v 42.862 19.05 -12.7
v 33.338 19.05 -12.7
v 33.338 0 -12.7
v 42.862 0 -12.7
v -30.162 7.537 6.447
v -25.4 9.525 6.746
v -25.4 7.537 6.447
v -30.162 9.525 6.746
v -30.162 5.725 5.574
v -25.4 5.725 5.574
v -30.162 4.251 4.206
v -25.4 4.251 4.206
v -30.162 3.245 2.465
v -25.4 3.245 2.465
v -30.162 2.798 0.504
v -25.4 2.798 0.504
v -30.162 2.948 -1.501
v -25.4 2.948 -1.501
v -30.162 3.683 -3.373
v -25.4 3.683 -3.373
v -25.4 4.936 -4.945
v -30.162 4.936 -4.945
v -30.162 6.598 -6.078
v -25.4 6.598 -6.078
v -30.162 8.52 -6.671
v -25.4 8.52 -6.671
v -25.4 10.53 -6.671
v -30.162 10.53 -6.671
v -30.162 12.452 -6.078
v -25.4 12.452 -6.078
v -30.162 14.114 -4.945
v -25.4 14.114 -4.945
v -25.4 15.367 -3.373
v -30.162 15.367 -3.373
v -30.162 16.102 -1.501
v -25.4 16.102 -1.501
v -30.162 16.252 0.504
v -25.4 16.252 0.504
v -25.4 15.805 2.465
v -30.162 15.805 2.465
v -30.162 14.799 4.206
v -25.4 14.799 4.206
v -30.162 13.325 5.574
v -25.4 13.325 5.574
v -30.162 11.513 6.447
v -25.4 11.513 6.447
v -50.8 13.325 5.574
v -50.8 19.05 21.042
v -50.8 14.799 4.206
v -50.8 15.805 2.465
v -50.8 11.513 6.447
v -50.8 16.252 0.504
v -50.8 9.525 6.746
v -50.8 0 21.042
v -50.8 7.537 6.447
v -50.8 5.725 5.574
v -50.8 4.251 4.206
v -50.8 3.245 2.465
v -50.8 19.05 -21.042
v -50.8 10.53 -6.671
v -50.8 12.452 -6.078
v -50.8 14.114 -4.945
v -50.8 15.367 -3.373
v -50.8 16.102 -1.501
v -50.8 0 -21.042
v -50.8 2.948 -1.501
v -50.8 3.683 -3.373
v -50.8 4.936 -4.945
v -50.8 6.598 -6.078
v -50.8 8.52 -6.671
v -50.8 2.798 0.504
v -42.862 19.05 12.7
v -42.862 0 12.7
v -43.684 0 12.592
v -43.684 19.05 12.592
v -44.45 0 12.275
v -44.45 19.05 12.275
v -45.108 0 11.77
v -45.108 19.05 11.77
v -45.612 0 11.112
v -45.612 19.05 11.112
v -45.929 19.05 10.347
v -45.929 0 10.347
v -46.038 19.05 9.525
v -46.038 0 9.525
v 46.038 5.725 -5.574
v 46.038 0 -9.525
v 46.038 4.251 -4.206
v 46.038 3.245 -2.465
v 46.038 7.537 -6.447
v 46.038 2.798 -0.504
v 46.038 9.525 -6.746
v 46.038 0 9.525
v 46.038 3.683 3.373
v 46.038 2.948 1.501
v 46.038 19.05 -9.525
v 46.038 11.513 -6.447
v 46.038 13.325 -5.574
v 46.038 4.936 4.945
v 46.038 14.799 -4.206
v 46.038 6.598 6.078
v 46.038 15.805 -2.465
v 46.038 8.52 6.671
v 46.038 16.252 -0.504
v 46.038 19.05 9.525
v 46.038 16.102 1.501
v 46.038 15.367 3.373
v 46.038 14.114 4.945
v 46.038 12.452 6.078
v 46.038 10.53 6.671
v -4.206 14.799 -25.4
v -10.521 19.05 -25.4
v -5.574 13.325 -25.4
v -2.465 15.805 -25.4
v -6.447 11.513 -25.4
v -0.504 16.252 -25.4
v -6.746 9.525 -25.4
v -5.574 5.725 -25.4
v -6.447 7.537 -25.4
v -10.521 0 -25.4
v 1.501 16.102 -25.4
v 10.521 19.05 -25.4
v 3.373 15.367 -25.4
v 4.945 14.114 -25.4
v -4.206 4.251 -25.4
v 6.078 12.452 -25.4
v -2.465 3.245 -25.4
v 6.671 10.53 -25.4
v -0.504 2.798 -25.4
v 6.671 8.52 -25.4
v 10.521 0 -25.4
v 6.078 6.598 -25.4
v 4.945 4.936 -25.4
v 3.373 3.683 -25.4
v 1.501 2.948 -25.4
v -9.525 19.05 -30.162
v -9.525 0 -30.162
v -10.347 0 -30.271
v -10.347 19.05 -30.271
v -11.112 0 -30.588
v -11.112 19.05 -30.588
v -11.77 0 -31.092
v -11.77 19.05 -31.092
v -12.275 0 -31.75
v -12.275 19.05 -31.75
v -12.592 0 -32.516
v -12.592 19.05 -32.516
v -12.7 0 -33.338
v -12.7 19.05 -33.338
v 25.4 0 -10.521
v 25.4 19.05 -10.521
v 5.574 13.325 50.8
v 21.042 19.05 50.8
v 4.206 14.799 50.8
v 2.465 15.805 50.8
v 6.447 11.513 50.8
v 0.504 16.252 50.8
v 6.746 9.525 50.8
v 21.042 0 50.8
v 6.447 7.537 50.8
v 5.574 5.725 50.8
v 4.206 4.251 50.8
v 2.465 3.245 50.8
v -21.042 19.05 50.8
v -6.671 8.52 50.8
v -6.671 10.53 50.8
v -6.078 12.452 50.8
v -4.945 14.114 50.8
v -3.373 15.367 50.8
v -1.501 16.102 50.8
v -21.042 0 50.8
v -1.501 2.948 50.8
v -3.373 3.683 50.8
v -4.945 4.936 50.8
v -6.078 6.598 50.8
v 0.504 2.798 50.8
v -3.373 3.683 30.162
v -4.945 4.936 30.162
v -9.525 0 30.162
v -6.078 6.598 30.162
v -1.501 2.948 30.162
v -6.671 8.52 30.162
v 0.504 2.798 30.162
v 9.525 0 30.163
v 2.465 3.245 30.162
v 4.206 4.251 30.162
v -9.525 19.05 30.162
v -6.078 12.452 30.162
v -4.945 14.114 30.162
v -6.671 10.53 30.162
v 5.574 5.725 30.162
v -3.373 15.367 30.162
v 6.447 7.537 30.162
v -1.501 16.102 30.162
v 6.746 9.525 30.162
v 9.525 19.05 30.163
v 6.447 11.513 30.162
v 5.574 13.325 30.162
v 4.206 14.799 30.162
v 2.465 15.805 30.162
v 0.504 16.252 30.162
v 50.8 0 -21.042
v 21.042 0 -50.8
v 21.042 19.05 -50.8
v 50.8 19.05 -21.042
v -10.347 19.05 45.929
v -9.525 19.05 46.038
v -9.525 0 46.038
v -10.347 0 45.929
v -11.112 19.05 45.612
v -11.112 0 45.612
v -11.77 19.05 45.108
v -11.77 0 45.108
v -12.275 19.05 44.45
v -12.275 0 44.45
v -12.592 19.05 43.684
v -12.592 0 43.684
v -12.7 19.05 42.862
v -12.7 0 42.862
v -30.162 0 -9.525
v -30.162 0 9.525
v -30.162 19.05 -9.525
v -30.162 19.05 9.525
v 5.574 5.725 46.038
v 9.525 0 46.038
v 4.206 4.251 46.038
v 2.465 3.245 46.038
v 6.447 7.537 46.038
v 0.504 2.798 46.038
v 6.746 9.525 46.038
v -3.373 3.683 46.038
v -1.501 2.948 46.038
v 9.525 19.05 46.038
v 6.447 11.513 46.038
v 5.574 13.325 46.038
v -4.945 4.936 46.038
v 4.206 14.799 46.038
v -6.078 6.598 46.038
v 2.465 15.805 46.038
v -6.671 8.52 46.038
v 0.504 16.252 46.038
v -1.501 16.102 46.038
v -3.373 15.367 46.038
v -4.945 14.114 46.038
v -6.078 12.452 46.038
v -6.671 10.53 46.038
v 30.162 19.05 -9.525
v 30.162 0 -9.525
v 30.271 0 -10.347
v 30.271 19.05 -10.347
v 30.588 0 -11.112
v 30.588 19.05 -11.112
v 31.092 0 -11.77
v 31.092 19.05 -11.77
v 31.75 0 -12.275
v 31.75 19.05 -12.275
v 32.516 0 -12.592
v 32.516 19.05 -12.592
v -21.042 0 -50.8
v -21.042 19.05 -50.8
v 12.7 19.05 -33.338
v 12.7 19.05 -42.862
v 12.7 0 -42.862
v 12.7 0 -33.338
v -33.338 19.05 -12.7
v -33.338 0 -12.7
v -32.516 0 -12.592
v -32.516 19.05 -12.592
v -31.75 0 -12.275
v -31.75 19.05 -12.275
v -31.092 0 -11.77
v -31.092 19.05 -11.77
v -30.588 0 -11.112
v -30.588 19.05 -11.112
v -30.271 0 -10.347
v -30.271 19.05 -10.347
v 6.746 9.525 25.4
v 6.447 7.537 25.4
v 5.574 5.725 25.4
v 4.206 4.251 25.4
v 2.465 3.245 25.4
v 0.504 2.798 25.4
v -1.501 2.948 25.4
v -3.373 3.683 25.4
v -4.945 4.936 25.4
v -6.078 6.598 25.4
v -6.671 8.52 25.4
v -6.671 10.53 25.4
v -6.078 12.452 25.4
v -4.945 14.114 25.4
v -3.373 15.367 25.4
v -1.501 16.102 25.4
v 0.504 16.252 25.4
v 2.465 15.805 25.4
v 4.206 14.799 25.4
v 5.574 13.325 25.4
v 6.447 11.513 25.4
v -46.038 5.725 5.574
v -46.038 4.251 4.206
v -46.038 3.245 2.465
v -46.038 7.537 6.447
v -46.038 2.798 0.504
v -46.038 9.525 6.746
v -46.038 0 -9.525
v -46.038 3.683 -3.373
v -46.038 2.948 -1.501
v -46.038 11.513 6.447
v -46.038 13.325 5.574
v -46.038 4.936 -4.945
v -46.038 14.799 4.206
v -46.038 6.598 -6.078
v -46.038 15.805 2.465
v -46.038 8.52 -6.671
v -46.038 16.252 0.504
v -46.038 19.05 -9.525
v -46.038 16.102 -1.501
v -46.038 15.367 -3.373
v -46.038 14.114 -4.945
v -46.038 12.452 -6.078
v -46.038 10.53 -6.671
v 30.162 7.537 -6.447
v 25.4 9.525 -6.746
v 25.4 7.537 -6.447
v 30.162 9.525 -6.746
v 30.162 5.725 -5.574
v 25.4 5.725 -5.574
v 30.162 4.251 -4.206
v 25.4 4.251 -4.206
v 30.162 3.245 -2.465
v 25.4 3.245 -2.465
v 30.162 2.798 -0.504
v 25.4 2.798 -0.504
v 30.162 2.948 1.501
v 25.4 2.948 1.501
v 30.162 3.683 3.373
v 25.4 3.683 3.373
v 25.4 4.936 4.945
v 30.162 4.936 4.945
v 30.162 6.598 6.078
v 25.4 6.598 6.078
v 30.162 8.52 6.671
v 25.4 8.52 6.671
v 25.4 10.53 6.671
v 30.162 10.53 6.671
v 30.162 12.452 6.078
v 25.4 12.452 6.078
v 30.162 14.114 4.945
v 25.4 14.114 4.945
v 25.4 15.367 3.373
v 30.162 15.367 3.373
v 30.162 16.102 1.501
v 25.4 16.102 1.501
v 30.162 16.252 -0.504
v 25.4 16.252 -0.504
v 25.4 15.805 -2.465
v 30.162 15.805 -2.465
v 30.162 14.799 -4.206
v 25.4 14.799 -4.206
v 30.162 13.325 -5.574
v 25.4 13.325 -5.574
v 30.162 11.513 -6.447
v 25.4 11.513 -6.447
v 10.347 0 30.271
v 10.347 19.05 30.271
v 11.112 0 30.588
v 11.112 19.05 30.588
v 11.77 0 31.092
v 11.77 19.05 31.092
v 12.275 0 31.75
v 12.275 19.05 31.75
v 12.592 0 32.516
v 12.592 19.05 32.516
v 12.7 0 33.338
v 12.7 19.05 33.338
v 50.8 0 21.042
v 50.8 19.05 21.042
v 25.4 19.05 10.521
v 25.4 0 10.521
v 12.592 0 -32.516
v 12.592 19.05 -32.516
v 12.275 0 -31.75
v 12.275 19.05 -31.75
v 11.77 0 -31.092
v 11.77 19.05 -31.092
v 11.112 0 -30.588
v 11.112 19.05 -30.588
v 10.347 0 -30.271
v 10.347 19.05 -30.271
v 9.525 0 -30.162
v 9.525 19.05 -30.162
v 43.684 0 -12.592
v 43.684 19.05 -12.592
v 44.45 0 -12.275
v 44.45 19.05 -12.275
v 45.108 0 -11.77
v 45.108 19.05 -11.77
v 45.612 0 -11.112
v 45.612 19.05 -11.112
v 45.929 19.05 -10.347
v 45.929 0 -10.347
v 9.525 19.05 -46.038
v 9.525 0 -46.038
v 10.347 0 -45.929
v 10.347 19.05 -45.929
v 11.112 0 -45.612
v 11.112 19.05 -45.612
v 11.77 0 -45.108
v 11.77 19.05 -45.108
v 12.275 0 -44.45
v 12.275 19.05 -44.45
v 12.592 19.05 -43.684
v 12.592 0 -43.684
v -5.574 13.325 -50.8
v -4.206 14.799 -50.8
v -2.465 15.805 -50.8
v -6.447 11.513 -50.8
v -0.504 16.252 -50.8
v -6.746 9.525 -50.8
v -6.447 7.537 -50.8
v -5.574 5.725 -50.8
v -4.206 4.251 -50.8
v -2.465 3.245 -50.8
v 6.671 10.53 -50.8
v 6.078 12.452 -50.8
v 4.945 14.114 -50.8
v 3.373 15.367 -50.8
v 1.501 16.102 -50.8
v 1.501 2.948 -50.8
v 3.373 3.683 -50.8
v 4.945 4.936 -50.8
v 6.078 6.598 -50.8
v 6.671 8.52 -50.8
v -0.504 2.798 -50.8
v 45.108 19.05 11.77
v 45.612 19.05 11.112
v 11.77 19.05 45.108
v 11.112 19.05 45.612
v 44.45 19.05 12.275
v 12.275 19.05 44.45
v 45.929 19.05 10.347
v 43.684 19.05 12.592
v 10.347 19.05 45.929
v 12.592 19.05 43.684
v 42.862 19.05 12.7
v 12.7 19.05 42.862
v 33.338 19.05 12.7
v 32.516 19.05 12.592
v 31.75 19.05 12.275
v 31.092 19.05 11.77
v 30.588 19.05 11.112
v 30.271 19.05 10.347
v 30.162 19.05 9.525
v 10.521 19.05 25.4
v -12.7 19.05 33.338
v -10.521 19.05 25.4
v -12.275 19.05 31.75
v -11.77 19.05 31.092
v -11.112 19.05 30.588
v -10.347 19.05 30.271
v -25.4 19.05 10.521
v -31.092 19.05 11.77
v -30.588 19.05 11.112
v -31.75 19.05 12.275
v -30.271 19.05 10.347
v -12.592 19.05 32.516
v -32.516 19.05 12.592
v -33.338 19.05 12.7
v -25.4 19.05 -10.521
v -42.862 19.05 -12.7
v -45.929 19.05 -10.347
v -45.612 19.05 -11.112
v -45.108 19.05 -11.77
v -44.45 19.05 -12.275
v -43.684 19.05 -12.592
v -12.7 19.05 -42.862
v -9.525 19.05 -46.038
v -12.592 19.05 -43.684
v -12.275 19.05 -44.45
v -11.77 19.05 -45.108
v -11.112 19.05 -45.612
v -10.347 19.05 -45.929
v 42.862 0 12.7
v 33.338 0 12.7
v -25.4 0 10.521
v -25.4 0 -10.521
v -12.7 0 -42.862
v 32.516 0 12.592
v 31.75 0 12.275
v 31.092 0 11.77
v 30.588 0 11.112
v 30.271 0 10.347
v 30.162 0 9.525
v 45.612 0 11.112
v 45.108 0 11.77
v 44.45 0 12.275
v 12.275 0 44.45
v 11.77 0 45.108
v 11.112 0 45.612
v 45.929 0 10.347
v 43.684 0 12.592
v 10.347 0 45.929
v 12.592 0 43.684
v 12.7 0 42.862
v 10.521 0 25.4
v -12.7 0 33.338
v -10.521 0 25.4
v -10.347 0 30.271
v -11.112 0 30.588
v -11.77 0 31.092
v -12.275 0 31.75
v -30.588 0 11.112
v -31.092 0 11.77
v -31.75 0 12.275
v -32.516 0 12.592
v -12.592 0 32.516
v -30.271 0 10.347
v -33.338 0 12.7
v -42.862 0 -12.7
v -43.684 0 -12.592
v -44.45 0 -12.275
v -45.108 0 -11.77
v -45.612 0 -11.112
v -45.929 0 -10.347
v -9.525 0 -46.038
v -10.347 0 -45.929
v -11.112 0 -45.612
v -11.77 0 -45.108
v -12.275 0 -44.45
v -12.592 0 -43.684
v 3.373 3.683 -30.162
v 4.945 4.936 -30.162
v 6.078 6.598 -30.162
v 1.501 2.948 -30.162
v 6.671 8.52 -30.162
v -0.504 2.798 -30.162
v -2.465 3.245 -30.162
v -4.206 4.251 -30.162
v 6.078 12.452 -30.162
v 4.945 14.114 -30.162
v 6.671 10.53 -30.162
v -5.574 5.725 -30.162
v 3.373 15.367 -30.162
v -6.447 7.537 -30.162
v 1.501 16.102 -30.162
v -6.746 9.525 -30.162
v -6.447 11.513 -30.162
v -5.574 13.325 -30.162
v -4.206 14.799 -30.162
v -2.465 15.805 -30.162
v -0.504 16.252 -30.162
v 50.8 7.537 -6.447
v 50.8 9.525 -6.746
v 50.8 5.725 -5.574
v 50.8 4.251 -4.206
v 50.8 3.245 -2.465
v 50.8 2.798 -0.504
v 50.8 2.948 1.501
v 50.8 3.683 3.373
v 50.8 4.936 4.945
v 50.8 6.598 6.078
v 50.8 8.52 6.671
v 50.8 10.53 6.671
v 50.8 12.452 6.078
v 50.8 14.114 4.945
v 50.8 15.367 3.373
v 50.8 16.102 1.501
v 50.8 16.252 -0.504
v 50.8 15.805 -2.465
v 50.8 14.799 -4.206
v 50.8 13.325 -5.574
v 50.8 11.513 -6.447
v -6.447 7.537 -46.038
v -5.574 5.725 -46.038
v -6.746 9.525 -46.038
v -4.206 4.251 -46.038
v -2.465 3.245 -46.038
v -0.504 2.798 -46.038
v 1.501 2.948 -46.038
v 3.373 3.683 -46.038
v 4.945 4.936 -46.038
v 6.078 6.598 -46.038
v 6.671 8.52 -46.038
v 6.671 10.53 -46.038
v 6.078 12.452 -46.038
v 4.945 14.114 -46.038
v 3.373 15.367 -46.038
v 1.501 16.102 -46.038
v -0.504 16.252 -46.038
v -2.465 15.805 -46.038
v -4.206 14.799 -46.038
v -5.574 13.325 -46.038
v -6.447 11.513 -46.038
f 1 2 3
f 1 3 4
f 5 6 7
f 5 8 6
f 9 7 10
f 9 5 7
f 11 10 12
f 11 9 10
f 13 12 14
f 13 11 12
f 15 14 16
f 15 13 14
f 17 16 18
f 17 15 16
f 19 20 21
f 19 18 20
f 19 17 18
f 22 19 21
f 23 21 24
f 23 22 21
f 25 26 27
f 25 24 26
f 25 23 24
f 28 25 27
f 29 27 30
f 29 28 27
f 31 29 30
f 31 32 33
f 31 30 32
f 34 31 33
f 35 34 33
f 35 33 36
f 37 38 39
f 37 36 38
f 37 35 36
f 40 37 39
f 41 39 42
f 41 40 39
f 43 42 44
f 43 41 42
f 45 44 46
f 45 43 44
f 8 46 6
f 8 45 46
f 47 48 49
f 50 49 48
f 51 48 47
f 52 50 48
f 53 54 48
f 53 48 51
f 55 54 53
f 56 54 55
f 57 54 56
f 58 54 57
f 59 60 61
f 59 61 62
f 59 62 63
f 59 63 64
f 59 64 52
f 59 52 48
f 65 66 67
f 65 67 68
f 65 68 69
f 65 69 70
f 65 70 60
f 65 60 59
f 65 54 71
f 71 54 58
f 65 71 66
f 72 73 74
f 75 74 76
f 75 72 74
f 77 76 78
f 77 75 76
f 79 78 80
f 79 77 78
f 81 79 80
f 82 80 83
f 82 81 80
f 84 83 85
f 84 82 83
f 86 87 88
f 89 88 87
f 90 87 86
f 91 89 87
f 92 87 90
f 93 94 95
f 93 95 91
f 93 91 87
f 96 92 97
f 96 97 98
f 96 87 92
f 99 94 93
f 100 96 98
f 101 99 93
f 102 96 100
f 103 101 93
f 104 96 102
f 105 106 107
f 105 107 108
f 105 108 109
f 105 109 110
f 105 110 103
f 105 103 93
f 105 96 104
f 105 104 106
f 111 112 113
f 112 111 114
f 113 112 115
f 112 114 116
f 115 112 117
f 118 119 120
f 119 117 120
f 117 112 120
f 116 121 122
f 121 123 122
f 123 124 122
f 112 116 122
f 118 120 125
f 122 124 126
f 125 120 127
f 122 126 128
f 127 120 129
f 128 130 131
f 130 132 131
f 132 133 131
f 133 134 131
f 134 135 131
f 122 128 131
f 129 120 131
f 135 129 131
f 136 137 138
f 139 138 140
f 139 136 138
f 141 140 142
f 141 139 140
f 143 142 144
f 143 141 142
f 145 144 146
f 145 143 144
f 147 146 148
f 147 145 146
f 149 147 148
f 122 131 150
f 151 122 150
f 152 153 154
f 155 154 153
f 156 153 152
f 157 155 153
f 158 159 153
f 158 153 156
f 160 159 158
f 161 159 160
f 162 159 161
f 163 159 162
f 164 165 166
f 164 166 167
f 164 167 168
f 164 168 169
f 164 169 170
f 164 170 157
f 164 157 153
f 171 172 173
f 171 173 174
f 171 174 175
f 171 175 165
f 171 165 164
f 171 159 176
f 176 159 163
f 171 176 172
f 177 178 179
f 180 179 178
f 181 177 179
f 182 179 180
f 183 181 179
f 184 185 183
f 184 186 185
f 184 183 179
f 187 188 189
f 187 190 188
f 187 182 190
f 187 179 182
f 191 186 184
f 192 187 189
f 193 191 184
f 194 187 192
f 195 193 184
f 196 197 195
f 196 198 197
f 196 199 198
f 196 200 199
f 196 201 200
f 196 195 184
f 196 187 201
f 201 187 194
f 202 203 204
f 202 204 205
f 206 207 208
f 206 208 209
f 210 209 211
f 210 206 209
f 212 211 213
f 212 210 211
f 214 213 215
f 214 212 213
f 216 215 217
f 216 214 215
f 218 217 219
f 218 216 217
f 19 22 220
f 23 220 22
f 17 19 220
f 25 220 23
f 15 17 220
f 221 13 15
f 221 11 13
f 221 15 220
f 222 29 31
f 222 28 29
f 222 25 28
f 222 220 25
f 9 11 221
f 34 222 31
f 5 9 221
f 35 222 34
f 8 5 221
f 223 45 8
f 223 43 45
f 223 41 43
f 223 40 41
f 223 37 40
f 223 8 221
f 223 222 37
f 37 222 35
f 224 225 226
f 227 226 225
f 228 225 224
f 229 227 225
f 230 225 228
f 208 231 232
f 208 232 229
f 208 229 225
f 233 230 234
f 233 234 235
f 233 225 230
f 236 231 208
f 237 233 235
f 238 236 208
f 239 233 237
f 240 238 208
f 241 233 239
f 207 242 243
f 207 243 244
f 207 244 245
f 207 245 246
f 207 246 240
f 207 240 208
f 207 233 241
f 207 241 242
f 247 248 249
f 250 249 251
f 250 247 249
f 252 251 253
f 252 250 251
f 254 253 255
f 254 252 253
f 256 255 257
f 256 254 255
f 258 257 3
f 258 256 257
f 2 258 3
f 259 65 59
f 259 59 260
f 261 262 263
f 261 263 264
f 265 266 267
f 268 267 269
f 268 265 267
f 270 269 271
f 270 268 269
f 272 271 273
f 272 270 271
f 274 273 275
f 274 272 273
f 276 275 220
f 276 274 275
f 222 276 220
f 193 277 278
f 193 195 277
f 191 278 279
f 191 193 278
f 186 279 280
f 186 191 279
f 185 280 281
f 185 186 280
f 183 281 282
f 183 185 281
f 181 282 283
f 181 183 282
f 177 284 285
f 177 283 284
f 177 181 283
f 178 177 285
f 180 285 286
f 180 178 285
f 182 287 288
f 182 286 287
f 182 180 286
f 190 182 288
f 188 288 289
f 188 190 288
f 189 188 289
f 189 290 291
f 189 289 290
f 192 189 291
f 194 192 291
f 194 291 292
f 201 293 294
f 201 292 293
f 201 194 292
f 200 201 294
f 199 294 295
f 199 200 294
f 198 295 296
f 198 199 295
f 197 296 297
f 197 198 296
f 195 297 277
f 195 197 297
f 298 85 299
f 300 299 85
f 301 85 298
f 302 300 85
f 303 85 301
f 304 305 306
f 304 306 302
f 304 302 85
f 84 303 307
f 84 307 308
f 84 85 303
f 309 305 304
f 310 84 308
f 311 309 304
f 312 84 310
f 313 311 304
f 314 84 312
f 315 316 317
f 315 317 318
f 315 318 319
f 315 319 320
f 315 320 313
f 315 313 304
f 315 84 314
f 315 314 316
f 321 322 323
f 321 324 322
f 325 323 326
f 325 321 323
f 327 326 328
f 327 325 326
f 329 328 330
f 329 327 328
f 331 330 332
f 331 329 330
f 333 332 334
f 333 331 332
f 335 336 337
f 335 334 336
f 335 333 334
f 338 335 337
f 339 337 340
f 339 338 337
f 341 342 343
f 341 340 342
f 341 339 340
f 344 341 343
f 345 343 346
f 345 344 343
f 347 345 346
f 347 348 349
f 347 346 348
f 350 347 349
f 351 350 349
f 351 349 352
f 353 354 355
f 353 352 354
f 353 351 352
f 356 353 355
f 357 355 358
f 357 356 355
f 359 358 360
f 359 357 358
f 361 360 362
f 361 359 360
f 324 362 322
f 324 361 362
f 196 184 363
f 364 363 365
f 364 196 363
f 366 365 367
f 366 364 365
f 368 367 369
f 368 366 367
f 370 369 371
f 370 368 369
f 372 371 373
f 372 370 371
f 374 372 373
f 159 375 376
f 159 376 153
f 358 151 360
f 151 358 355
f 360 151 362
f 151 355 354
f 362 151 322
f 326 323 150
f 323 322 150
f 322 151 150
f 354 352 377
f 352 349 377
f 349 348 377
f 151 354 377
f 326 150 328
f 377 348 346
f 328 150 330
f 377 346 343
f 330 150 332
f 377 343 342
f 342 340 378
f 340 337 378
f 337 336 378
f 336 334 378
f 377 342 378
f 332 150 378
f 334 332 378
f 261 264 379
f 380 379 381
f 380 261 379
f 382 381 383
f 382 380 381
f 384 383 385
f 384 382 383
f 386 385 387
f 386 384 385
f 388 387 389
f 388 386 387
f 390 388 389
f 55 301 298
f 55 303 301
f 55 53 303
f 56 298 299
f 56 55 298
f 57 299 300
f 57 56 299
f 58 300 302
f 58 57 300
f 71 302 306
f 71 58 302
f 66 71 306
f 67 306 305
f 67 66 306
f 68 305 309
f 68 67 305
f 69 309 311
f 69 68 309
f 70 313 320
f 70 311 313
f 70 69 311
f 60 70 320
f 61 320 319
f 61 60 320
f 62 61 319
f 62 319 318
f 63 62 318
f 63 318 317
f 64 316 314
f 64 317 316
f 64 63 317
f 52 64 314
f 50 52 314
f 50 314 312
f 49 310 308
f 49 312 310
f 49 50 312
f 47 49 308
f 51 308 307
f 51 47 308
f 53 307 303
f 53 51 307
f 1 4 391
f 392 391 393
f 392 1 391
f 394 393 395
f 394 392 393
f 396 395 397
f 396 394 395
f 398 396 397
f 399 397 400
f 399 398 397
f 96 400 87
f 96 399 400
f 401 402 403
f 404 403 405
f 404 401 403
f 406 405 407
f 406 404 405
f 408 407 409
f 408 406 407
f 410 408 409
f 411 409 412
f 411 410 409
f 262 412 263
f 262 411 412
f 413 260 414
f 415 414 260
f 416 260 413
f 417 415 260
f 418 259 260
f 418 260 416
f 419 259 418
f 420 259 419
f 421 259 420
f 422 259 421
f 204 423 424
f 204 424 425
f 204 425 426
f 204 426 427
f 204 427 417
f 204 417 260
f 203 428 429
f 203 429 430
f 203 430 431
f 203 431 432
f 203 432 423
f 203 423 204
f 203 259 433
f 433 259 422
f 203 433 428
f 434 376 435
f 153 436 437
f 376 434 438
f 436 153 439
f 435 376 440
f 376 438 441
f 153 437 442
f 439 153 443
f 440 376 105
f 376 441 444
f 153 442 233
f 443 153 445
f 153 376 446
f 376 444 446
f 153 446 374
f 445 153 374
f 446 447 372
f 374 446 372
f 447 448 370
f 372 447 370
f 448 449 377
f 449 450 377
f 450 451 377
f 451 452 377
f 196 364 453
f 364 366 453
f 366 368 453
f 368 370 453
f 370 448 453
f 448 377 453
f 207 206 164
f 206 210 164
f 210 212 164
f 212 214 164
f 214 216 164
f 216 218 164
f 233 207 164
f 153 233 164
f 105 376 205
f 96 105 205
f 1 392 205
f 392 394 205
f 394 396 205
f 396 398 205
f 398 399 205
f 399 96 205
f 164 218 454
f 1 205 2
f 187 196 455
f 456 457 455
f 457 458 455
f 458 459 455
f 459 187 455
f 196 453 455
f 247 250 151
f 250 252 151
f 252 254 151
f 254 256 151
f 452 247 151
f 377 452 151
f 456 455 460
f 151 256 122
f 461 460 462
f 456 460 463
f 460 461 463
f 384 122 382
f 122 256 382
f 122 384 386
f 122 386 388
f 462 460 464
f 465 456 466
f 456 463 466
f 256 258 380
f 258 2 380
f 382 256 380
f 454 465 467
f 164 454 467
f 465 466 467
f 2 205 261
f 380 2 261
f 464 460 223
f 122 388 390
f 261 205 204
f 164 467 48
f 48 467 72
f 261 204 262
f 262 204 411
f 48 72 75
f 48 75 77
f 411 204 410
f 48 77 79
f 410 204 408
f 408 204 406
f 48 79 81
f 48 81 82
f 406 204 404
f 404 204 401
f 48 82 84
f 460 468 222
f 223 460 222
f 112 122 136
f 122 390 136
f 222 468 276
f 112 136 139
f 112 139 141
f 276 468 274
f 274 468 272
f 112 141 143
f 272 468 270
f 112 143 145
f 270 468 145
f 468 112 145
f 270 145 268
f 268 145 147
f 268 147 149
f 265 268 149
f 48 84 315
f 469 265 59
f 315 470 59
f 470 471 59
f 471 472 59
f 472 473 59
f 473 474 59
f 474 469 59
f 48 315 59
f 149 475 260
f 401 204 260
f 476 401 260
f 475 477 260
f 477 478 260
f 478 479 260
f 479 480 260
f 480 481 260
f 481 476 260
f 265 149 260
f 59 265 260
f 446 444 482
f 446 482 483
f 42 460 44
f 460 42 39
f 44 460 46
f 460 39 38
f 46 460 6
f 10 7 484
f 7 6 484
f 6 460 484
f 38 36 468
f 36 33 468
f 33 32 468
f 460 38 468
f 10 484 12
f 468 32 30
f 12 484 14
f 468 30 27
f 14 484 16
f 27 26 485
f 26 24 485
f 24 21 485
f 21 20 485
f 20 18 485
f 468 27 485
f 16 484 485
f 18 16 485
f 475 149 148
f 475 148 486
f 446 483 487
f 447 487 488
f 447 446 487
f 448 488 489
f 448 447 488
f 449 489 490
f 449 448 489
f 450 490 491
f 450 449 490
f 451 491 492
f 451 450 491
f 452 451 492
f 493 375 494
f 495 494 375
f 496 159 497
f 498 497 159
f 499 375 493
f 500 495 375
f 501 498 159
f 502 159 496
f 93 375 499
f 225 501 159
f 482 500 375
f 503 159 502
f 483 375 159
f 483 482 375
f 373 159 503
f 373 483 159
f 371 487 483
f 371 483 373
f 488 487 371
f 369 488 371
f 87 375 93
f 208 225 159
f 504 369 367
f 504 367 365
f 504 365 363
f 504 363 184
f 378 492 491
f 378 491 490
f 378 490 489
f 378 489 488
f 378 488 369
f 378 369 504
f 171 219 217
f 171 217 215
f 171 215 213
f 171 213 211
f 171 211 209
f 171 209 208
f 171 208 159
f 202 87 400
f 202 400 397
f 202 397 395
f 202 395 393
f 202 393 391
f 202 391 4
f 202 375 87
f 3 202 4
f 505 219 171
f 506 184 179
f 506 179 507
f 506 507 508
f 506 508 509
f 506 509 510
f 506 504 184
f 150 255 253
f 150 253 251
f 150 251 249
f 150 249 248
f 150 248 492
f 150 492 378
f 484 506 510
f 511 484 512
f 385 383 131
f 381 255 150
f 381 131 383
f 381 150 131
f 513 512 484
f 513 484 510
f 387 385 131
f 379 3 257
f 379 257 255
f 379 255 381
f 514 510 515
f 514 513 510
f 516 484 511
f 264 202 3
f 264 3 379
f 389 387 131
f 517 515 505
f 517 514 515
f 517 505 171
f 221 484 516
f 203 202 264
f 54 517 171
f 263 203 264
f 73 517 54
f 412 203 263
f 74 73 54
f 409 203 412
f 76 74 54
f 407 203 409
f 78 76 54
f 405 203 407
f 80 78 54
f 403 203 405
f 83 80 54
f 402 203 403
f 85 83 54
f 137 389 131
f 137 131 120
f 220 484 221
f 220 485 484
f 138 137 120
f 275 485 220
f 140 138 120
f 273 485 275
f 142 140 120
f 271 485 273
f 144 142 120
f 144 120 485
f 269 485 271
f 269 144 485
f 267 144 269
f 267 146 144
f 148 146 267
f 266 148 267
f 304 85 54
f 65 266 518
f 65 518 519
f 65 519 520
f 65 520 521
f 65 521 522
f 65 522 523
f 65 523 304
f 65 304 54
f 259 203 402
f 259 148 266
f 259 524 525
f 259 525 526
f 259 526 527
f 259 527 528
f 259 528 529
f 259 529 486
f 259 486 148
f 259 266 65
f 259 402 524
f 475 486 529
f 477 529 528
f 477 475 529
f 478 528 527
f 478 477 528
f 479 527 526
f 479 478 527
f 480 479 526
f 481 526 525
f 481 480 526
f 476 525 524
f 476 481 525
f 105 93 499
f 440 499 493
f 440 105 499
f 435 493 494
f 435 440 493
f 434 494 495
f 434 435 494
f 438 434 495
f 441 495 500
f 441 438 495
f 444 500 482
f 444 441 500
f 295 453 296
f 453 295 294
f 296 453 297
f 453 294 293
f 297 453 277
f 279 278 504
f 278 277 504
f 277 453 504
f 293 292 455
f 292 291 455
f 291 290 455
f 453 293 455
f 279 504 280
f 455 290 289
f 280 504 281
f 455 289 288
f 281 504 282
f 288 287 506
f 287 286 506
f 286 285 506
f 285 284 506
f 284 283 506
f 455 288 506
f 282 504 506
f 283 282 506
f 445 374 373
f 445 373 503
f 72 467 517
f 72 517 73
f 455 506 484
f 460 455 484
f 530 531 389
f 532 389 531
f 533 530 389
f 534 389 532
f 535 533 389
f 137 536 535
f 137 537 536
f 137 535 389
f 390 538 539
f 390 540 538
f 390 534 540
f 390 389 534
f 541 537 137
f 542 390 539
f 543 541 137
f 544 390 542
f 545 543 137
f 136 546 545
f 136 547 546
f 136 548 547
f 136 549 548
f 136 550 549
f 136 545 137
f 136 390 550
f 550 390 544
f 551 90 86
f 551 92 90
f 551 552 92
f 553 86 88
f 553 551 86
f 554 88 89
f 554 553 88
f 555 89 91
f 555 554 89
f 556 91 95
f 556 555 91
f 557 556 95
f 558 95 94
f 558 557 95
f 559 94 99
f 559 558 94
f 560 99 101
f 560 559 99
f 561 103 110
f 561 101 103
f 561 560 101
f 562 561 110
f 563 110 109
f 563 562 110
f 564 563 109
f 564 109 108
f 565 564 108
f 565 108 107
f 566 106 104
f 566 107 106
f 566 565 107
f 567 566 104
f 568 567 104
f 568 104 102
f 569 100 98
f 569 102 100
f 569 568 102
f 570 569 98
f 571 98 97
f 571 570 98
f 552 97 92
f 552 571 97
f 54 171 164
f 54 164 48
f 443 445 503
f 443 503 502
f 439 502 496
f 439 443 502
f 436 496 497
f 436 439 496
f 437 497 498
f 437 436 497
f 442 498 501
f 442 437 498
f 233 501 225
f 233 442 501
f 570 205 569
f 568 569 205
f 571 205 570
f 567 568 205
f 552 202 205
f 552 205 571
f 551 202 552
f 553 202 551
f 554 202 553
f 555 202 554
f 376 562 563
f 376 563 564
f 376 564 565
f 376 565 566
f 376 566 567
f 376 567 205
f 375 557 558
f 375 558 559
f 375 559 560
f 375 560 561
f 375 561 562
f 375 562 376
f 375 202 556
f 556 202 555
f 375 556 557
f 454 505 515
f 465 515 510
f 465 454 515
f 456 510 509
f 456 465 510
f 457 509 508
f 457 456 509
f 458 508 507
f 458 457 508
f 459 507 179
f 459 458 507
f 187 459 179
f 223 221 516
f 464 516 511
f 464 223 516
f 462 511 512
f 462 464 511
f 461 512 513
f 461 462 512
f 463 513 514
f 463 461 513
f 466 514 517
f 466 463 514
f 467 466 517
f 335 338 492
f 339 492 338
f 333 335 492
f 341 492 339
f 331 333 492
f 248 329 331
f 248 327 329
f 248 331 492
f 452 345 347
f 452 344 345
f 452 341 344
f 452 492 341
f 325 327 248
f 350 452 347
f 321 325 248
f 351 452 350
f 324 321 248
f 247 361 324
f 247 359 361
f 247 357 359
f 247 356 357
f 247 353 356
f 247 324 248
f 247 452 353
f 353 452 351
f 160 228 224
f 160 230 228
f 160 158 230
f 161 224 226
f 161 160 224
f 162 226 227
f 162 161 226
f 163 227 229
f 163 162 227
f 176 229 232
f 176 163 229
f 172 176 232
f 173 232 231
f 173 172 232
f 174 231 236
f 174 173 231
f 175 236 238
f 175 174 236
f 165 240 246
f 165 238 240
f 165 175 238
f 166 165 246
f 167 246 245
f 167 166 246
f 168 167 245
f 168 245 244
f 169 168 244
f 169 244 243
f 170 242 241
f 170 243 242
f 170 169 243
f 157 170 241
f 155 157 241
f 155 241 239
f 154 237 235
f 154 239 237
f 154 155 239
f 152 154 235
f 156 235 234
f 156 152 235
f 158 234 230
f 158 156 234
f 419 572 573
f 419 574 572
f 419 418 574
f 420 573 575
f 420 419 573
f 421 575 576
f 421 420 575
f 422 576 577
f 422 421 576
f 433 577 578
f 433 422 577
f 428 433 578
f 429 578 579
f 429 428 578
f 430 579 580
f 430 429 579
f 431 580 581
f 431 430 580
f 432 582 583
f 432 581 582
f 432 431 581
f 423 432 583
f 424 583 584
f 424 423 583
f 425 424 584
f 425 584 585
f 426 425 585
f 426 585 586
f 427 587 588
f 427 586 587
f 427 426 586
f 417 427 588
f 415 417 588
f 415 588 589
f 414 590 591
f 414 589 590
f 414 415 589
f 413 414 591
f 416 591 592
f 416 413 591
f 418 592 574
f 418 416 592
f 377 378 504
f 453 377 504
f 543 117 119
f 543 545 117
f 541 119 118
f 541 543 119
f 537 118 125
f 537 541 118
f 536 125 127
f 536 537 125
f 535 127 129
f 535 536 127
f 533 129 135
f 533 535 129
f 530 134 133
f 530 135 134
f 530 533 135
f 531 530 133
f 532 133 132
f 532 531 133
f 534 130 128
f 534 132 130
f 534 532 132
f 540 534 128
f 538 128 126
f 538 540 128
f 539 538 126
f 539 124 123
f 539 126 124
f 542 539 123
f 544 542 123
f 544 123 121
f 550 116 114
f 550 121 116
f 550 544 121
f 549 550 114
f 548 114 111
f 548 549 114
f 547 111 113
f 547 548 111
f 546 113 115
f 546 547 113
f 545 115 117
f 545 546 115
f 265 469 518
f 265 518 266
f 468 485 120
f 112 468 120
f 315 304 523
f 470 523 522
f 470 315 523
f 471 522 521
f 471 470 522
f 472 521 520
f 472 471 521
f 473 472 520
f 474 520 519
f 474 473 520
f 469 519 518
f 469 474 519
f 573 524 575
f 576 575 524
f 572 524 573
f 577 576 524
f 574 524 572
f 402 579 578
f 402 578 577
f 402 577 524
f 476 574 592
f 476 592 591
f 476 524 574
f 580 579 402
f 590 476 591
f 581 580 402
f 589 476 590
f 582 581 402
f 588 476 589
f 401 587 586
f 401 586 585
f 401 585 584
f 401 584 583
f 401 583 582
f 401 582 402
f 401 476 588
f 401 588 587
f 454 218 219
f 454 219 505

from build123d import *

# Parameters (mm, degrees)
BOSS_EXTRUDE1_DEPTH = 19.05
CUT_EXTRUDE1_DEPTH  = 75.324844433
CIRPATTERN1_COUNT   = 4


with BuildPart() as part:
    # Sketch1 → Boss-Extrude1 (new body)
    with BuildSketch(Plane(origin=(0, 0, 0), x_dir=(1, 0, 0), z_dir=(0, 1, 0))):
        Polygon((-50.8, -21.042048969), (-50.8, 21.042048969), (-21.042048969, 50.8), (21.042048969, 50.8), (50.8, 21.042048969), (50.8, -21.042048969), (21.042048969, -50.8), (-21.042048969, -50.8), align=None)
        Polygon((-25.4, 10.521024484), (-10.521024484, 25.4), (10.521024484, 25.4), (25.4, 10.521024484), (25.4, -10.521024484), (10.521024484, -25.4), (-10.521024484, -25.4), (-25.4, -10.521024484), align=None, mode=Mode.SUBTRACT)
    extrude(amount=BOSS_EXTRUDE1_DEPTH)

    # Sketch2 → Cut-Extrude1 (cut, through all)
    with BuildSketch(Plane(origin=(0, 19.05, 0), x_dir=(1, 0, 0), z_dir=(0, 1, 0))):
        with BuildLine():
            Line((33.3375, 12.7), (42.8625, 12.7))
            ThreePointArc((42.8625, 12.7), (45.10756403, 11.77006403), (46.0375, 9.525))
            Line((46.0375, 9.525), (46.0375, -9.525))
            ThreePointArc((46.0375, -9.525), (45.10756403, -11.77006403), (42.8625, -12.7))
            Line((42.8625, -12.7), (33.3375, -12.7))
            ThreePointArc((33.3375, -12.7), (31.09243597, -11.77006403), (30.1625, -9.525))
            Line((30.1625, -9.525), (30.1625, 9.525))
            ThreePointArc((30.1625, 9.525), (31.09243597, 11.77006403), (33.3375, 12.7))
        make_face()
    cut_extrude1 = extrude(amount=-CUT_EXTRUDE1_DEPTH, mode=Mode.SUBTRACT)

    # Sketch4 → 1/2 Clearance Hole1 (revolve, cut)
    with BuildSketch(Plane(origin=(50.8, 9.525, 0), x_dir=(0, 0, -1), z_dir=(0, 1, 0))):
        Polygon((0, 0), (0, 67.553549943), (6.74624, 63.5), (6.74624, 0), align=None)
    f_1_2_clearance_hole1 = revolve(axis=Axis((57.15, 9.525, 0), (-1, 0, 0)), mode=Mode.SUBTRACT)

    # CirPattern1: Cut-Extrude1, 1/2 Clearance Hole1 ×4 about axis
    cirpattern1_axis = Axis((0, -0.9525, 0), (0, 1, 0))
    add([cut_extrude1.rotate(cirpattern1_axis, i * 360 / CIRPATTERN1_COUNT) for i in range(1, CIRPATTERN1_COUNT)], mode=Mode.SUBTRACT)
    add([f_1_2_clearance_hole1.rotate(cirpattern1_axis, i * 360 / CIRPATTERN1_COUNT) for i in range(1, CIRPATTERN1_COUNT)], mode=Mode.SUBTRACT)


solid = part.part
